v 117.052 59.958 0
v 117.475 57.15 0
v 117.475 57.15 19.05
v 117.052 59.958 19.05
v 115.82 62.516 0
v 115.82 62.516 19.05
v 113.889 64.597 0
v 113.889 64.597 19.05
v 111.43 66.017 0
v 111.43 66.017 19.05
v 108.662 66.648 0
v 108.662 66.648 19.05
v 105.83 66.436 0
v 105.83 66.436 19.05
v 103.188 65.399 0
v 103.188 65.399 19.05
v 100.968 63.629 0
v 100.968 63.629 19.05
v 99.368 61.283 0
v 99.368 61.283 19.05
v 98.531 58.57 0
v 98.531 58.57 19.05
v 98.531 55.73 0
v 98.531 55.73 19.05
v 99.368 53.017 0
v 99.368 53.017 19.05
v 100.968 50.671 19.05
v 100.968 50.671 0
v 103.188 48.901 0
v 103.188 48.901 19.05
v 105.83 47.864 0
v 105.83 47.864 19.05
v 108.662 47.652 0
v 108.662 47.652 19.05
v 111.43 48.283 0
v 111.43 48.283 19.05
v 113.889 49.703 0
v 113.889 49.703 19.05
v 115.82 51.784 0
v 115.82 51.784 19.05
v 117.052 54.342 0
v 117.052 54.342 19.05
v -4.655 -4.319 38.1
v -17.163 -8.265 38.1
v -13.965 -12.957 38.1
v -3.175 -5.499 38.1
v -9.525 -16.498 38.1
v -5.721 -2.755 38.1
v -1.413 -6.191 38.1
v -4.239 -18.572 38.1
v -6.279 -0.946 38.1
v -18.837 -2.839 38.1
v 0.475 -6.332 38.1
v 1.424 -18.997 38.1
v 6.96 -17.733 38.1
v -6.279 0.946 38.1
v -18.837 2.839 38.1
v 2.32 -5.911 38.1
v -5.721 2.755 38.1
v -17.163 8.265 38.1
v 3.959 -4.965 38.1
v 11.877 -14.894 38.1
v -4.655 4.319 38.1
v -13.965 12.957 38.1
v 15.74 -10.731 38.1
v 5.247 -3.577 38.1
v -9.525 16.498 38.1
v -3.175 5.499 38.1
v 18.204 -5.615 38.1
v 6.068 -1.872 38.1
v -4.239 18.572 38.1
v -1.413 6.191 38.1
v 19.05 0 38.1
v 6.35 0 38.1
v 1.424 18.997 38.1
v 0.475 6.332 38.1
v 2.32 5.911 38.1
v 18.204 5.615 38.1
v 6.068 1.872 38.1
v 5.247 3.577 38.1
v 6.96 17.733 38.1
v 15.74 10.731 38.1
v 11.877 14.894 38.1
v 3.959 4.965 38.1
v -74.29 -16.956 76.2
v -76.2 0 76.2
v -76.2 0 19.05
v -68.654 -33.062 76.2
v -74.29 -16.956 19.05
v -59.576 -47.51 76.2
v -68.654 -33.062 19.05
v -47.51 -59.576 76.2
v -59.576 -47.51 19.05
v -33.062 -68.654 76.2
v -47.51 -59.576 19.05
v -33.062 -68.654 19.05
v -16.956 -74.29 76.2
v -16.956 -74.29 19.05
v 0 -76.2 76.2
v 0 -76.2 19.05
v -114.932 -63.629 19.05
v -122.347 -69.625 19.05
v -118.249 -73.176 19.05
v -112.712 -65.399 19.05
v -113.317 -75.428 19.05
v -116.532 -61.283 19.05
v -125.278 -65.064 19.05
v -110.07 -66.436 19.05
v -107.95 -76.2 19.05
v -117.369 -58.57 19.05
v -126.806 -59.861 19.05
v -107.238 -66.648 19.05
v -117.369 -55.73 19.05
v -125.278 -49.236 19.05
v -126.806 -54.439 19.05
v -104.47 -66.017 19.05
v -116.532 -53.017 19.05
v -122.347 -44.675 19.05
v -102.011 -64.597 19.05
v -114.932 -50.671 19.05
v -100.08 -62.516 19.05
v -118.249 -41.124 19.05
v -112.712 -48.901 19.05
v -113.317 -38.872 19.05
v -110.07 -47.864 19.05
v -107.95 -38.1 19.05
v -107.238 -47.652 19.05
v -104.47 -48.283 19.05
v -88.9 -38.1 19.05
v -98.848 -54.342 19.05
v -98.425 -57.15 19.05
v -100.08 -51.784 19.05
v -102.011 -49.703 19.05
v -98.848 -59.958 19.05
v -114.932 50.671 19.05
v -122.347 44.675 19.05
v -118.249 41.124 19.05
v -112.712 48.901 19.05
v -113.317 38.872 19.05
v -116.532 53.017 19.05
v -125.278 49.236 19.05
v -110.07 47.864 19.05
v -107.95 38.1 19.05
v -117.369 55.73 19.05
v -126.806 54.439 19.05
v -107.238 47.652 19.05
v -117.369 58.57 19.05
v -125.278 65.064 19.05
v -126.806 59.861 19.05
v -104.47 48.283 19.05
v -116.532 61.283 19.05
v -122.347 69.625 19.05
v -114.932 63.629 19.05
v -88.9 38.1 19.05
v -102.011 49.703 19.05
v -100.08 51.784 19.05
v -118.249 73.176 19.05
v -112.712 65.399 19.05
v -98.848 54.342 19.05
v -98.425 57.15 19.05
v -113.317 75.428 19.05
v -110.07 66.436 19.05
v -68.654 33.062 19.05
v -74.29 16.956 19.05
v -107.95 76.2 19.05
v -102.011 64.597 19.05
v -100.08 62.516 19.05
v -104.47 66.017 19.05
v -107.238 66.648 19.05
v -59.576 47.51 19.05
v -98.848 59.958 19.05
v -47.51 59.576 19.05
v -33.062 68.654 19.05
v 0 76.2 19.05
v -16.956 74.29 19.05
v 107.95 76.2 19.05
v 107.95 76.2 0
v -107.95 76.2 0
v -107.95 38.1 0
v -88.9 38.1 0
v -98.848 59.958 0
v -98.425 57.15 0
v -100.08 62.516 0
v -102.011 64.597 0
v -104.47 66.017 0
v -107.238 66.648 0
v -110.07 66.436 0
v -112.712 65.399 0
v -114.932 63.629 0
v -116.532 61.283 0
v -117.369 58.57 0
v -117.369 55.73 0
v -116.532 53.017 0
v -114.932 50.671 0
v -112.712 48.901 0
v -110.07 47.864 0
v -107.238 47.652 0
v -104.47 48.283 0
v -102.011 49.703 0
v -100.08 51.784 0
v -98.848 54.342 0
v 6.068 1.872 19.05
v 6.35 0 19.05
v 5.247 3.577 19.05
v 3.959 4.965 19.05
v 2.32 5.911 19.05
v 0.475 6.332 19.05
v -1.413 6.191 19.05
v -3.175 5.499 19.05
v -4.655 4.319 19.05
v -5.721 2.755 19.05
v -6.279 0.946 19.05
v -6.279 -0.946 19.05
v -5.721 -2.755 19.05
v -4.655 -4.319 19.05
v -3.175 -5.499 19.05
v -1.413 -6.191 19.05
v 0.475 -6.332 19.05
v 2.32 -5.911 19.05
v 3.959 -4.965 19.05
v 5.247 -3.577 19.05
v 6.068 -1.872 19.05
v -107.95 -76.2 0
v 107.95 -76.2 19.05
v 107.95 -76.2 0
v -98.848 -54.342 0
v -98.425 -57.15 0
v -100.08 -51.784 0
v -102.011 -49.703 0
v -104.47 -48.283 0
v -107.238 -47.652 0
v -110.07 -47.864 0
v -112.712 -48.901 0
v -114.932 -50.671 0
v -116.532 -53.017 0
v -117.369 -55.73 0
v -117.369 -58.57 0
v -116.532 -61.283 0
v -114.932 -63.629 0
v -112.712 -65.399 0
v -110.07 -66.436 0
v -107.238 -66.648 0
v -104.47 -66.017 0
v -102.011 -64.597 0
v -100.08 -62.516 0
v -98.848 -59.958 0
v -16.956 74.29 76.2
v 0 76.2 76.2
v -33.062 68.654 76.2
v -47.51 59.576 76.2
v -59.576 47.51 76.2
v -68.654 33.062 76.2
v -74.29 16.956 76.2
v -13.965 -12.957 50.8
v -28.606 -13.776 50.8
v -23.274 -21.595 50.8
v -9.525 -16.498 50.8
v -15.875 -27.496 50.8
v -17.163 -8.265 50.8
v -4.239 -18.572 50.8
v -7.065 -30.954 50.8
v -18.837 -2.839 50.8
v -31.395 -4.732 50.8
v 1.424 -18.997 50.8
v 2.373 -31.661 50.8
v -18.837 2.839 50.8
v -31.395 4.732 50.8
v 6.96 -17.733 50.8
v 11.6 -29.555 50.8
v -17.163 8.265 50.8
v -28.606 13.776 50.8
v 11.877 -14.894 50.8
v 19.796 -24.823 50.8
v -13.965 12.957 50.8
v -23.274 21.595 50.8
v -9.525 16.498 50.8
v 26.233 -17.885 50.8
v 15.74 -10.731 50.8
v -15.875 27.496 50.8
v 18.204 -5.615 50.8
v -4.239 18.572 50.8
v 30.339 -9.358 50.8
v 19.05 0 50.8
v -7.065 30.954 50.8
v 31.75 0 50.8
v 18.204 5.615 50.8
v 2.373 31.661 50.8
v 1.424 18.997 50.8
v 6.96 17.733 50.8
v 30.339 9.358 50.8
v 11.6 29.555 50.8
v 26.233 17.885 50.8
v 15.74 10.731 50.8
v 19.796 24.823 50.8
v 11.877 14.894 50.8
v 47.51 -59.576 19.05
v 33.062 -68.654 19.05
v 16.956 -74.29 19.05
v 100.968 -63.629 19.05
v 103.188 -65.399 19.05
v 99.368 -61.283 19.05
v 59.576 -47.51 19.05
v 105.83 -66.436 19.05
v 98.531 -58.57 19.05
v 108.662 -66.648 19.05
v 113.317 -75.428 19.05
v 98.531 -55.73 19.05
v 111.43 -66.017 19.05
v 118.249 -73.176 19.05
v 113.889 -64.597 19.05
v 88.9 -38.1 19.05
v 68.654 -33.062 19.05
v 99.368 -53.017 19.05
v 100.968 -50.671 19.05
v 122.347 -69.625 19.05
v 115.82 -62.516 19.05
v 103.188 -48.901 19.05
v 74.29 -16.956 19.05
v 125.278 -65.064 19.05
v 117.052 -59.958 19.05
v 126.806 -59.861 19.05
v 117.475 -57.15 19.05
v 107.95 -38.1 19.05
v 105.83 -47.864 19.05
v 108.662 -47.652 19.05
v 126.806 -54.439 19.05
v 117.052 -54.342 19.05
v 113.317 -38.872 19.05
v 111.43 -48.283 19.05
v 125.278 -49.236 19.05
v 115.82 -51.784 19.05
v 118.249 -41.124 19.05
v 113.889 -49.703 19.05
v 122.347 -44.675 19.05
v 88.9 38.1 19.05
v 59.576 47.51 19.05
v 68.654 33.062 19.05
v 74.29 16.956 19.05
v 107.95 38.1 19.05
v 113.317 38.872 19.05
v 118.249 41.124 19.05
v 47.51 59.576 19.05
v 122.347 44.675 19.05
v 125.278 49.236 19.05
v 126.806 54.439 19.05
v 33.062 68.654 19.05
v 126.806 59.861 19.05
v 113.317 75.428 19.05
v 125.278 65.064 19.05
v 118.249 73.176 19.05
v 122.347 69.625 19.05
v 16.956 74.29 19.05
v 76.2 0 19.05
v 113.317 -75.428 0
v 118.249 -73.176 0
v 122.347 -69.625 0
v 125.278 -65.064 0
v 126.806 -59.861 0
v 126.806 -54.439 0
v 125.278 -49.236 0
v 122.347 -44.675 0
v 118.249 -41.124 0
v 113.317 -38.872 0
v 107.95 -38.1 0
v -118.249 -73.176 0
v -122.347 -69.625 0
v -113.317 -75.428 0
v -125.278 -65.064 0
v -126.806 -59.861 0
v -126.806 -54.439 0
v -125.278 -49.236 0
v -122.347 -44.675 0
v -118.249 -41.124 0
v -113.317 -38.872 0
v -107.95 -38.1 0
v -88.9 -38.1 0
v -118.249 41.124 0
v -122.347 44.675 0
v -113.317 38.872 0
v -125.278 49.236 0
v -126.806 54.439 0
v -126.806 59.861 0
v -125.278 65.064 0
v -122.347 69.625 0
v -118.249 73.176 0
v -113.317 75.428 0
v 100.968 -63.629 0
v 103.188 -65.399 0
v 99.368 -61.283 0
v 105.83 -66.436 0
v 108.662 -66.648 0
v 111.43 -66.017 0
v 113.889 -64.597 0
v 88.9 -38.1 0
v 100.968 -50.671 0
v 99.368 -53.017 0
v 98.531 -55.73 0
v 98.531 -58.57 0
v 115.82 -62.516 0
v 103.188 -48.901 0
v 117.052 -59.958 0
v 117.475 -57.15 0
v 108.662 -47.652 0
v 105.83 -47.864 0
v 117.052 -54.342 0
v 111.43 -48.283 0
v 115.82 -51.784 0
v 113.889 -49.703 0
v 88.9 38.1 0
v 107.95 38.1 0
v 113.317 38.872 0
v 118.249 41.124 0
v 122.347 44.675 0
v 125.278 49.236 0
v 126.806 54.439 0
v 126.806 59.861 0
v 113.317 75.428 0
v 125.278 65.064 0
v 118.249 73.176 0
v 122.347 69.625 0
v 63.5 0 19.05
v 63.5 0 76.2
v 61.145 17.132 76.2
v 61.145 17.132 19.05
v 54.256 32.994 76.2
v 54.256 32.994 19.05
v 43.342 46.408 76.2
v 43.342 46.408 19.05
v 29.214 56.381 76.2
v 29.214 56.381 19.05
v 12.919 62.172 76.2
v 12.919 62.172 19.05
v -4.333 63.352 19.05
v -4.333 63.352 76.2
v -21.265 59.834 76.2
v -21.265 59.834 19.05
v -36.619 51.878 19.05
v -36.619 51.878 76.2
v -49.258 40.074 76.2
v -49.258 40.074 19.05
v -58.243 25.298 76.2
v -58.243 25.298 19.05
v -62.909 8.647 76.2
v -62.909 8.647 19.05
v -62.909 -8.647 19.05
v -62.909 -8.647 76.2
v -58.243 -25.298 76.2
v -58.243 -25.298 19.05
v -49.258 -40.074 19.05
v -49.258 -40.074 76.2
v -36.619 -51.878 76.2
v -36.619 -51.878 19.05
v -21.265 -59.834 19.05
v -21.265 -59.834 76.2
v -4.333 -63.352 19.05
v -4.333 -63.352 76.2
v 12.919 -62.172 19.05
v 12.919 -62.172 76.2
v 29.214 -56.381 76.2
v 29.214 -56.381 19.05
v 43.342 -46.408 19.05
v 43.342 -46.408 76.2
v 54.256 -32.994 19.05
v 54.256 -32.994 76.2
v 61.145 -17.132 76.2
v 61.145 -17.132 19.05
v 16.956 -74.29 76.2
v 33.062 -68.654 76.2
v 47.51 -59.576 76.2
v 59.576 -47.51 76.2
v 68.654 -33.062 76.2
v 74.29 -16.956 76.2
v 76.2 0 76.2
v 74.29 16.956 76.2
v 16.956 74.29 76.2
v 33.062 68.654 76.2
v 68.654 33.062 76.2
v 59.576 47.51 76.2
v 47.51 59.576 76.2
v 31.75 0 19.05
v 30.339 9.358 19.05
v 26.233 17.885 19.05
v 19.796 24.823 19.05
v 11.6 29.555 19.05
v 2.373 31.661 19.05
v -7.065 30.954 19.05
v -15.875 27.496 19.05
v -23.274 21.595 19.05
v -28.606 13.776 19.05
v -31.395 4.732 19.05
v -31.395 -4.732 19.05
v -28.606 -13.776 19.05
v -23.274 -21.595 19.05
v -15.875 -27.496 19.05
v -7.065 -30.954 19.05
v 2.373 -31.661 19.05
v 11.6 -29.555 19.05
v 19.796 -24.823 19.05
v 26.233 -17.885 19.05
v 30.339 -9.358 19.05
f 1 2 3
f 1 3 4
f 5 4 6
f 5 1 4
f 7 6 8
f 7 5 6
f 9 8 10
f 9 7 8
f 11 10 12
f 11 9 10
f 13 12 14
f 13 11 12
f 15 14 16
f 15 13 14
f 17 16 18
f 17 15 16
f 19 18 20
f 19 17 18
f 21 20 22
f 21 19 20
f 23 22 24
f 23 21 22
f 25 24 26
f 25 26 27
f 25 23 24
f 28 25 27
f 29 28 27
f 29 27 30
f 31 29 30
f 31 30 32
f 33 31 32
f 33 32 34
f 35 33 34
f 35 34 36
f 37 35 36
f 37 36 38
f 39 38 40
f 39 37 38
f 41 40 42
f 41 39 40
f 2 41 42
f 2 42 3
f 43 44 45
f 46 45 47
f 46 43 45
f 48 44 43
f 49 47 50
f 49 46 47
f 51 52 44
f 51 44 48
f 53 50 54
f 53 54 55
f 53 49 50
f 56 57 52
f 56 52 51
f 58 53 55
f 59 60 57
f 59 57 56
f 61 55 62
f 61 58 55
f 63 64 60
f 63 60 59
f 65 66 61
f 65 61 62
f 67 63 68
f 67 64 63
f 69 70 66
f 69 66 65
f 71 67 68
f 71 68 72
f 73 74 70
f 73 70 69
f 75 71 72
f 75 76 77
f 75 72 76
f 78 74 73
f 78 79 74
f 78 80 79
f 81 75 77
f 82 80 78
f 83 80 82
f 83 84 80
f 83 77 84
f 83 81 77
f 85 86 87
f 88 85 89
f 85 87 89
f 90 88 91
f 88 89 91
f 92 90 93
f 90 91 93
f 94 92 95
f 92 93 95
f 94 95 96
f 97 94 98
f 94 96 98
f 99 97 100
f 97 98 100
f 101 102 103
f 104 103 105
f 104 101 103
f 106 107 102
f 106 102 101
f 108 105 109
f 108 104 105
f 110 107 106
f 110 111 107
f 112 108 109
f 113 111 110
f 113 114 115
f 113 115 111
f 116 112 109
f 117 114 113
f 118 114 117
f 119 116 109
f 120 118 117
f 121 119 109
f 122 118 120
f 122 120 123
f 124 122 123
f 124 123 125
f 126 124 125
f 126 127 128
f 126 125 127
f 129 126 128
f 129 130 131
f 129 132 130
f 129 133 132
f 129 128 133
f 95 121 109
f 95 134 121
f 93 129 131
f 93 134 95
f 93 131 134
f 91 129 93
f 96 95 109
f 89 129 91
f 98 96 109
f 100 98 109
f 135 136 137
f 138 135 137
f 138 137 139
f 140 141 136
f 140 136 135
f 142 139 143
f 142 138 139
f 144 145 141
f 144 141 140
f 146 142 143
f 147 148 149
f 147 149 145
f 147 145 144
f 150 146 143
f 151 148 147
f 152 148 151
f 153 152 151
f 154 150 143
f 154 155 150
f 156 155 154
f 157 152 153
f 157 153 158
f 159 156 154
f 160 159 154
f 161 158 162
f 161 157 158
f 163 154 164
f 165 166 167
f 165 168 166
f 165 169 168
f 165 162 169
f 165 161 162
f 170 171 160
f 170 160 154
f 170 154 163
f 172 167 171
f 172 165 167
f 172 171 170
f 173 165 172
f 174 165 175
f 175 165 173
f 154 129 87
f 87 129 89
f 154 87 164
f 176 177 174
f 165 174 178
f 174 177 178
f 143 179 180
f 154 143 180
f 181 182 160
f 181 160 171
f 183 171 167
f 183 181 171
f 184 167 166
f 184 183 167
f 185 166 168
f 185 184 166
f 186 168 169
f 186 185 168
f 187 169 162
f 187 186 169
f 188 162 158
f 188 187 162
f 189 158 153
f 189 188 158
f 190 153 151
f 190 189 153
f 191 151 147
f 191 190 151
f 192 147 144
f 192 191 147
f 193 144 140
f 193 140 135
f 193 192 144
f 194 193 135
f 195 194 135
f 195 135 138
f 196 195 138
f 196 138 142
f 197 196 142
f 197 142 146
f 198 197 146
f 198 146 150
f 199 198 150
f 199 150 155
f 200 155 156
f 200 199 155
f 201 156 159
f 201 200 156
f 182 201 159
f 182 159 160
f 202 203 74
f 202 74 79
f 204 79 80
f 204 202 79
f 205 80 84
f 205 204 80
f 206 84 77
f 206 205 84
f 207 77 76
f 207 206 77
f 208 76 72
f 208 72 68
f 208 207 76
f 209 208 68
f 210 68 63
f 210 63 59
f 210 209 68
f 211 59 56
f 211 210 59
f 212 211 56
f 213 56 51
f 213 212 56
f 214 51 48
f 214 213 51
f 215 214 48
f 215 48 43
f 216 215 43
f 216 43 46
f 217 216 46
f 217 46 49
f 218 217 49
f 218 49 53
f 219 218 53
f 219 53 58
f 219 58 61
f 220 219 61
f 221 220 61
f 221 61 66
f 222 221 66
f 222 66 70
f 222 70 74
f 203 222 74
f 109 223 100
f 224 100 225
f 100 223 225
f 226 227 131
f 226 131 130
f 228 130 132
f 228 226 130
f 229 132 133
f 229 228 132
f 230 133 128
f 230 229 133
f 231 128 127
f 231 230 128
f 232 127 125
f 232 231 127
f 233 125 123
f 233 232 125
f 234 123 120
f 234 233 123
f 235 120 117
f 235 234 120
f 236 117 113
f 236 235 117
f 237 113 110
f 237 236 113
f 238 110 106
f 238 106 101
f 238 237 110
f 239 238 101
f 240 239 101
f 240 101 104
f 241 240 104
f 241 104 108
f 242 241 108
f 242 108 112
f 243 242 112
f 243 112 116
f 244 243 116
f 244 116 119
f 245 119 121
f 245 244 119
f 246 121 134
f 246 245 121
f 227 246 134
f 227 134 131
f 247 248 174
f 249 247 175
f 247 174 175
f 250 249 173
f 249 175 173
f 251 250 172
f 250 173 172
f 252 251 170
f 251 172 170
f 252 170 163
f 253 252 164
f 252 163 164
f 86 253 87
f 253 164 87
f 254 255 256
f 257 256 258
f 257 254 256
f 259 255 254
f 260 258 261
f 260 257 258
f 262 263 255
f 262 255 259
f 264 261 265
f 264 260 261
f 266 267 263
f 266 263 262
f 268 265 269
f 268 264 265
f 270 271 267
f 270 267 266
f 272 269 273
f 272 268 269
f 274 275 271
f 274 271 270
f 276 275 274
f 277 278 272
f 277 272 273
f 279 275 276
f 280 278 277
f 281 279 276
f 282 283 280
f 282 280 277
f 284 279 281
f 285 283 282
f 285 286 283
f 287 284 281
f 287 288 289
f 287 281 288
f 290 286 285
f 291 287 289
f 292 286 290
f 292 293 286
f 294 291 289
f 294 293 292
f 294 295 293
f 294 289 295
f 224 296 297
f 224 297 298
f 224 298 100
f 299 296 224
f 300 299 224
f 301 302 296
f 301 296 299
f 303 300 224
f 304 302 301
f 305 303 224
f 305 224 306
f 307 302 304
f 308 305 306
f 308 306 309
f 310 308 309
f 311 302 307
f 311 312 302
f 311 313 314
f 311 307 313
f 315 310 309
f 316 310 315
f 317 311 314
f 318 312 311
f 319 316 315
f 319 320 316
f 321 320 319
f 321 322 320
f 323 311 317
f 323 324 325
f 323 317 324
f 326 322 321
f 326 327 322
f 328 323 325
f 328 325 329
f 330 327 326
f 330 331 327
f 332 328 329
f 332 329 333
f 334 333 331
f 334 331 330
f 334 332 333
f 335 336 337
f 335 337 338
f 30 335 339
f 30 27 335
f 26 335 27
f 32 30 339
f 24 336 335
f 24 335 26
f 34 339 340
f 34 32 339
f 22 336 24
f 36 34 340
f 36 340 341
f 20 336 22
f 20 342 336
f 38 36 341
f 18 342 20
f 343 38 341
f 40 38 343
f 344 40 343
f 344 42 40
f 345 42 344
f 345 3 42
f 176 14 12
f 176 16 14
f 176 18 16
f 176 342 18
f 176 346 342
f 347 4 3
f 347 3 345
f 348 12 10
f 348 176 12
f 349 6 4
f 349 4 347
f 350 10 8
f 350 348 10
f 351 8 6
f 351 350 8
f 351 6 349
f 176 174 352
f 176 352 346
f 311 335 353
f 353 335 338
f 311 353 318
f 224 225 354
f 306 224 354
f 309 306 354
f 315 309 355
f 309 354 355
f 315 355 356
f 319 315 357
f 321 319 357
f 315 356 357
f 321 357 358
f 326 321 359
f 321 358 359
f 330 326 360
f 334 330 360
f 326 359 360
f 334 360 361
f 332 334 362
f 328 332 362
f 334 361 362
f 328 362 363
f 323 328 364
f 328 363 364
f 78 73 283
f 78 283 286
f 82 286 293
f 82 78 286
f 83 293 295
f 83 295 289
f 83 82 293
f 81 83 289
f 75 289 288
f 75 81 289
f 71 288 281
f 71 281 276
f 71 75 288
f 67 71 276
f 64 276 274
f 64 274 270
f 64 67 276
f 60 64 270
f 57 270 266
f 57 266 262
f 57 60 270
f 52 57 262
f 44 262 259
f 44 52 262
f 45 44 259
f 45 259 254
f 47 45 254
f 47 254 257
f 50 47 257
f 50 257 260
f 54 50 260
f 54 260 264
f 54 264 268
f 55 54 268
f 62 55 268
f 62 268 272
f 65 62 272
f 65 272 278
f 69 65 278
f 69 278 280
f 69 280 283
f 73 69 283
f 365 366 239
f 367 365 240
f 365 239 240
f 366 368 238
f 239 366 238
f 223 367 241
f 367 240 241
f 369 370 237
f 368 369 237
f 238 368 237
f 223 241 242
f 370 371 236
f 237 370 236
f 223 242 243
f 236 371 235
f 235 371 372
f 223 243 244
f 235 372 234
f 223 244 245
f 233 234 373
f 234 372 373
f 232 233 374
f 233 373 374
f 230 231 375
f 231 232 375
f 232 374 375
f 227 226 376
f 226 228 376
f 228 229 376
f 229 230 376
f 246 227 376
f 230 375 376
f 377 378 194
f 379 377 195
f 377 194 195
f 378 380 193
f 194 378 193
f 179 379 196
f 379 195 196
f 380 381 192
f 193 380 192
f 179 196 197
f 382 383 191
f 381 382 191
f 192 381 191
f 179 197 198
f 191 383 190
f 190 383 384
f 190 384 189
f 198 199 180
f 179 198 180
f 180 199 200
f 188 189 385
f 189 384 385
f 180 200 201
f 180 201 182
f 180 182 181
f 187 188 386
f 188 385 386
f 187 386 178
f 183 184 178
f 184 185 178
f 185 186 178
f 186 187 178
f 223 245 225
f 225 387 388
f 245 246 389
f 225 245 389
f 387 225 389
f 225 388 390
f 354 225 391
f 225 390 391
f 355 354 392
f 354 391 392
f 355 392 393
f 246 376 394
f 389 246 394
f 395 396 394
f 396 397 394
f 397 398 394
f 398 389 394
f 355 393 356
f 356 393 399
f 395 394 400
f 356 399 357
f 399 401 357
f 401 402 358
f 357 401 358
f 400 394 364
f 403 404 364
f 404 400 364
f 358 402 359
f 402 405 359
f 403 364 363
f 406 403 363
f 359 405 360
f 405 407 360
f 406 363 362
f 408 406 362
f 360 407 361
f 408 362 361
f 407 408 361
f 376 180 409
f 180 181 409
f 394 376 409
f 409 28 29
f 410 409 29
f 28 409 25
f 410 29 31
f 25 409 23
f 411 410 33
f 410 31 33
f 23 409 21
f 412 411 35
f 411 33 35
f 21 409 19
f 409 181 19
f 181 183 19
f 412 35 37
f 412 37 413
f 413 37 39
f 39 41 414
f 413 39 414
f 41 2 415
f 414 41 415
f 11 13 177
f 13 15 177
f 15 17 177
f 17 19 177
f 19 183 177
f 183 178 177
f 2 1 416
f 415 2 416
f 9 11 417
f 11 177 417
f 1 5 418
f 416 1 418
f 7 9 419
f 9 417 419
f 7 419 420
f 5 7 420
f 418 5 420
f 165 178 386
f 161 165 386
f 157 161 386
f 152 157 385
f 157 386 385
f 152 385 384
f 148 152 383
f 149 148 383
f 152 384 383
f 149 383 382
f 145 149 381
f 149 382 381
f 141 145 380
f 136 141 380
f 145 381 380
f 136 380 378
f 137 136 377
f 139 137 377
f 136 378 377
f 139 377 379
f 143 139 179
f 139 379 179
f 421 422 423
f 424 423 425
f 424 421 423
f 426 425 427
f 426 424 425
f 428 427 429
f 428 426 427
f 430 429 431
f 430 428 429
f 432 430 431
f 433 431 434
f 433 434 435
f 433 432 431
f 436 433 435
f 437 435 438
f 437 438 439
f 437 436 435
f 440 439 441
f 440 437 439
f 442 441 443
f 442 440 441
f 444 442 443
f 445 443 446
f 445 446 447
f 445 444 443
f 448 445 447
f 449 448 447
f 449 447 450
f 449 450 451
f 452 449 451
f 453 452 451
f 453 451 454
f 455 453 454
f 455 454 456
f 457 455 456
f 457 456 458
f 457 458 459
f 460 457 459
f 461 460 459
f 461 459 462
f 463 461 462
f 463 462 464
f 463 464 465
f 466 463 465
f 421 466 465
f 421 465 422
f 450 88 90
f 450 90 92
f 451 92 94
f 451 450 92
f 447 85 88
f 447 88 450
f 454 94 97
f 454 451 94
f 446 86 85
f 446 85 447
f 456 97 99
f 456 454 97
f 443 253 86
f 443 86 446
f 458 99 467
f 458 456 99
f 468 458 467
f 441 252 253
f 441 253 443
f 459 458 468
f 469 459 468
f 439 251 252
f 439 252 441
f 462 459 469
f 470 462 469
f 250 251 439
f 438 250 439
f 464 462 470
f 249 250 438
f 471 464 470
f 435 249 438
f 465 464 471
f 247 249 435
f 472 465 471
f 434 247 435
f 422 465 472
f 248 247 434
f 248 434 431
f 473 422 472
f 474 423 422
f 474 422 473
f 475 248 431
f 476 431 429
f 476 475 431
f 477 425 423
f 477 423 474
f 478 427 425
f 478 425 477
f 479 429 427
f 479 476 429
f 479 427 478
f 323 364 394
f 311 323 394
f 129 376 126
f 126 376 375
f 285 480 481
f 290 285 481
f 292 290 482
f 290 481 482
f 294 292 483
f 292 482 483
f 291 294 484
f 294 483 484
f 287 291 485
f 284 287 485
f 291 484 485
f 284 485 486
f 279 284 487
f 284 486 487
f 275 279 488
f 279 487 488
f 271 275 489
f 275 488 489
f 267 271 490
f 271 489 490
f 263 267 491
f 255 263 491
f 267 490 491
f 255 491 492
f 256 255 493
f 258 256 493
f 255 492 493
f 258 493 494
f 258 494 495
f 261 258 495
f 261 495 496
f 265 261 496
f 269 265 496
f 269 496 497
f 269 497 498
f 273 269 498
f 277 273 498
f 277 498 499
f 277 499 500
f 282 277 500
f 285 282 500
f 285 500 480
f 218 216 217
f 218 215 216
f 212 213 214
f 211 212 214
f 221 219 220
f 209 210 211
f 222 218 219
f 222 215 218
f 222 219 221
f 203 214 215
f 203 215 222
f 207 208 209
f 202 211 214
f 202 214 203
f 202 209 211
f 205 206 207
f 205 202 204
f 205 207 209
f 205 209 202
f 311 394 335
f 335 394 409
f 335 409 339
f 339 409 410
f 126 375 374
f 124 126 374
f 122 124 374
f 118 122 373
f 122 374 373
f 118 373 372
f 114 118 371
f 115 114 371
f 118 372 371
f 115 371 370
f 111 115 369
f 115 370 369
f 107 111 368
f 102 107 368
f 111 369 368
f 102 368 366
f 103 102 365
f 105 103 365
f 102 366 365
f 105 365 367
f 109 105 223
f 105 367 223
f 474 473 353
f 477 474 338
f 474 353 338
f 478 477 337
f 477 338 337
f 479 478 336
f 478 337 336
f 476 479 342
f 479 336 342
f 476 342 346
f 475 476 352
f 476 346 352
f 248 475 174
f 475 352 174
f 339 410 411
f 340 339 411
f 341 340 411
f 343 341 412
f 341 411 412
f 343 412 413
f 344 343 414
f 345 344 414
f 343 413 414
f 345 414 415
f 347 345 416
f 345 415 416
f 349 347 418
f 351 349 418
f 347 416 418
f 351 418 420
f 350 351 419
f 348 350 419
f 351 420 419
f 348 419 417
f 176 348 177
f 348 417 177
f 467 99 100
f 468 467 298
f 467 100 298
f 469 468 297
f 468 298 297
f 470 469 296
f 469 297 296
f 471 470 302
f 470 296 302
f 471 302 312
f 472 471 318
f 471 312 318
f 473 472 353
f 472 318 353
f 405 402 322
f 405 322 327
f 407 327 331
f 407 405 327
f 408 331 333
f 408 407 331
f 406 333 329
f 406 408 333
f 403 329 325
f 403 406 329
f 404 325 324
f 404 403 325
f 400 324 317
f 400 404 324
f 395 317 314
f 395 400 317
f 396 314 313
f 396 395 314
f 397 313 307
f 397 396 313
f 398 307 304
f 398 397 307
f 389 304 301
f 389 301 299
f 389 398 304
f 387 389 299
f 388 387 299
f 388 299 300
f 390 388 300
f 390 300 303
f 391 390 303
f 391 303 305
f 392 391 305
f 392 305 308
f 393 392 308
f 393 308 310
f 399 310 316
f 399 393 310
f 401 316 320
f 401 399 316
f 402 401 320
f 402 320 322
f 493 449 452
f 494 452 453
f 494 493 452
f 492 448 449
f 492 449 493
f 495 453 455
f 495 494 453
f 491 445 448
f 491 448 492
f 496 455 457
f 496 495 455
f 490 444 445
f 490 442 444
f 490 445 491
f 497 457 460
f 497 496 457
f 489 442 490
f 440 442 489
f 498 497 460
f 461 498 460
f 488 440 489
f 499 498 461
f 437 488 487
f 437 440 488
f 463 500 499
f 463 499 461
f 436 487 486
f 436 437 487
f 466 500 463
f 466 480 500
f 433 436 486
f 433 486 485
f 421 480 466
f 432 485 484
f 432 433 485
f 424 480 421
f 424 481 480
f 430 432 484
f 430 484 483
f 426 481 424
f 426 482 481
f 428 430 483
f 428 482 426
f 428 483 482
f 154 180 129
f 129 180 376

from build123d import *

# Parameters (mm, degrees)
F0_R     = 9.525
F0_R_2   = 63.5
F0_R_3   = 31.75
F0_R_4   = 19.05
F0_R_5   = 6.35
F1_DEPTH = 19.05
F2_DEPTH = 76.2
F3_DEPTH = 50.8
F4_DEPTH = 38.1


with BuildPart() as f1:
    # F0 (on Top) → F1 (new body)
    with BuildSketch(Plane.XY):
        with BuildLine():
            ThreePointArc((0, 76.2), (53.881537, 53.881537), (76.2, 0))
            Line((76.2, 0), (88.9, 0))
            Line((88.9, 0), (88.9, 38.1))
            Line((88.9, 38.1), (107.95, 38.1))
            ThreePointArc((107.95, 38.1), (127, 57.15), (107.95, 76.2))
            Line((107.95, 76.2), (0, 76.2))
        make_face()
        with Locations((107.95, 57.15)):
            Circle(F0_R, mode=Mode.SUBTRACT)
        with BuildLine():
            ThreePointArc((-76.2, 0), (-53.881537, 53.881537), (0, 76.2))
            Line((0, 76.2), (-107.95, 76.2))
            ThreePointArc((-107.95, 76.2), (-127, 57.15), (-107.95, 38.1))
            Line((-107.95, 38.1), (-88.9, 38.1))
            Line((-88.9, 38.1), (-88.9, 0))
            Line((-88.9, 0), (-76.2, 0))
        make_face()
        with Locations((-107.95, 57.15)):
            Circle(F0_R, mode=Mode.SUBTRACT)
        with BuildLine():
            Line((-107.95, -76.2), (0, -76.2))
            ThreePointArc((0, -76.2), (-53.881537, -53.881537), (-76.2, 0))
            Line((-76.2, 0), (-88.9, 0))
            Line((-88.9, 0), (-88.9, -38.1))
            Line((-88.9, -38.1), (-107.95, -38.1))
            ThreePointArc((-107.95, -38.1), (-127, -57.15), (-107.95, -76.2))
        make_face()
        with Locations((-107.95, -57.15)):
            Circle(F0_R, mode=Mode.SUBTRACT)
        with BuildLine():
            Line((88.9, 0), (76.2, 0))
            ThreePointArc((76.2, 0), (53.881537, -53.881537), (0, -76.2))
            Line((0, -76.2), (107.95, -76.2))
            ThreePointArc((107.95, -76.2), (127, -57.15), (107.95, -38.1))
            Line((107.95, -38.1), (88.9, -38.1))
            Line((88.9, -38.1), (88.9, 0))
        make_face()
        with Locations((107.95, -57.15)):
            Circle(F0_R, mode=Mode.SUBTRACT)
        with BuildLine():
            ThreePointArc((0, -76.2), (53.881537, -53.881537), (76.2, 0))
            ThreePointArc((76.2, 0), (53.881537, 53.881537), (0, 76.2))
            ThreePointArc((0, 76.2), (-53.881537, 53.881537), (-76.2, 0))
            ThreePointArc((-76.2, 0), (-53.881537, -53.881537), (0, -76.2))
        make_face()
        Circle(F0_R_2, mode=Mode.SUBTRACT)
        Circle(F0_R_2)
        Circle(F0_R_3, mode=Mode.SUBTRACT)
        Circle(F0_R_3)
        Circle(F0_R_4, mode=Mode.SUBTRACT)
        Circle(F0_R_4)
        Circle(F0_R_5, mode=Mode.SUBTRACT)
        Circle(F0_R_5)
    extrude(amount=F1_DEPTH)

    # F0 (on Top) → F2 (join)
    with BuildSketch(Plane.XY):
        with BuildLine():
            ThreePointArc((0, -76.2), (53.881537, -53.881537), (76.2, 0))
            ThreePointArc((76.2, 0), (53.881537, 53.881537), (0, 76.2))
            ThreePointArc((0, 76.2), (-53.881537, 53.881537), (-76.2, 0))
            ThreePointArc((-76.2, 0), (-53.881537, -53.881537), (0, -76.2))
        make_face()
        Circle(F0_R_2, mode=Mode.SUBTRACT)
    extrude(amount=F2_DEPTH)

    # F0 (on Top) → F3 (join)
    with BuildSketch(Plane.XY):
        Circle(F0_R_3)
        Circle(F0_R_4, mode=Mode.SUBTRACT)
    extrude(amount=F3_DEPTH)

    # F0 (on Top) → F4 (join)
    with BuildSketch(Plane.XY):
        Circle(F0_R_4)
        Circle(F0_R_5, mode=Mode.SUBTRACT)
    extrude(amount=F4_DEPTH)


solid = f1.part
